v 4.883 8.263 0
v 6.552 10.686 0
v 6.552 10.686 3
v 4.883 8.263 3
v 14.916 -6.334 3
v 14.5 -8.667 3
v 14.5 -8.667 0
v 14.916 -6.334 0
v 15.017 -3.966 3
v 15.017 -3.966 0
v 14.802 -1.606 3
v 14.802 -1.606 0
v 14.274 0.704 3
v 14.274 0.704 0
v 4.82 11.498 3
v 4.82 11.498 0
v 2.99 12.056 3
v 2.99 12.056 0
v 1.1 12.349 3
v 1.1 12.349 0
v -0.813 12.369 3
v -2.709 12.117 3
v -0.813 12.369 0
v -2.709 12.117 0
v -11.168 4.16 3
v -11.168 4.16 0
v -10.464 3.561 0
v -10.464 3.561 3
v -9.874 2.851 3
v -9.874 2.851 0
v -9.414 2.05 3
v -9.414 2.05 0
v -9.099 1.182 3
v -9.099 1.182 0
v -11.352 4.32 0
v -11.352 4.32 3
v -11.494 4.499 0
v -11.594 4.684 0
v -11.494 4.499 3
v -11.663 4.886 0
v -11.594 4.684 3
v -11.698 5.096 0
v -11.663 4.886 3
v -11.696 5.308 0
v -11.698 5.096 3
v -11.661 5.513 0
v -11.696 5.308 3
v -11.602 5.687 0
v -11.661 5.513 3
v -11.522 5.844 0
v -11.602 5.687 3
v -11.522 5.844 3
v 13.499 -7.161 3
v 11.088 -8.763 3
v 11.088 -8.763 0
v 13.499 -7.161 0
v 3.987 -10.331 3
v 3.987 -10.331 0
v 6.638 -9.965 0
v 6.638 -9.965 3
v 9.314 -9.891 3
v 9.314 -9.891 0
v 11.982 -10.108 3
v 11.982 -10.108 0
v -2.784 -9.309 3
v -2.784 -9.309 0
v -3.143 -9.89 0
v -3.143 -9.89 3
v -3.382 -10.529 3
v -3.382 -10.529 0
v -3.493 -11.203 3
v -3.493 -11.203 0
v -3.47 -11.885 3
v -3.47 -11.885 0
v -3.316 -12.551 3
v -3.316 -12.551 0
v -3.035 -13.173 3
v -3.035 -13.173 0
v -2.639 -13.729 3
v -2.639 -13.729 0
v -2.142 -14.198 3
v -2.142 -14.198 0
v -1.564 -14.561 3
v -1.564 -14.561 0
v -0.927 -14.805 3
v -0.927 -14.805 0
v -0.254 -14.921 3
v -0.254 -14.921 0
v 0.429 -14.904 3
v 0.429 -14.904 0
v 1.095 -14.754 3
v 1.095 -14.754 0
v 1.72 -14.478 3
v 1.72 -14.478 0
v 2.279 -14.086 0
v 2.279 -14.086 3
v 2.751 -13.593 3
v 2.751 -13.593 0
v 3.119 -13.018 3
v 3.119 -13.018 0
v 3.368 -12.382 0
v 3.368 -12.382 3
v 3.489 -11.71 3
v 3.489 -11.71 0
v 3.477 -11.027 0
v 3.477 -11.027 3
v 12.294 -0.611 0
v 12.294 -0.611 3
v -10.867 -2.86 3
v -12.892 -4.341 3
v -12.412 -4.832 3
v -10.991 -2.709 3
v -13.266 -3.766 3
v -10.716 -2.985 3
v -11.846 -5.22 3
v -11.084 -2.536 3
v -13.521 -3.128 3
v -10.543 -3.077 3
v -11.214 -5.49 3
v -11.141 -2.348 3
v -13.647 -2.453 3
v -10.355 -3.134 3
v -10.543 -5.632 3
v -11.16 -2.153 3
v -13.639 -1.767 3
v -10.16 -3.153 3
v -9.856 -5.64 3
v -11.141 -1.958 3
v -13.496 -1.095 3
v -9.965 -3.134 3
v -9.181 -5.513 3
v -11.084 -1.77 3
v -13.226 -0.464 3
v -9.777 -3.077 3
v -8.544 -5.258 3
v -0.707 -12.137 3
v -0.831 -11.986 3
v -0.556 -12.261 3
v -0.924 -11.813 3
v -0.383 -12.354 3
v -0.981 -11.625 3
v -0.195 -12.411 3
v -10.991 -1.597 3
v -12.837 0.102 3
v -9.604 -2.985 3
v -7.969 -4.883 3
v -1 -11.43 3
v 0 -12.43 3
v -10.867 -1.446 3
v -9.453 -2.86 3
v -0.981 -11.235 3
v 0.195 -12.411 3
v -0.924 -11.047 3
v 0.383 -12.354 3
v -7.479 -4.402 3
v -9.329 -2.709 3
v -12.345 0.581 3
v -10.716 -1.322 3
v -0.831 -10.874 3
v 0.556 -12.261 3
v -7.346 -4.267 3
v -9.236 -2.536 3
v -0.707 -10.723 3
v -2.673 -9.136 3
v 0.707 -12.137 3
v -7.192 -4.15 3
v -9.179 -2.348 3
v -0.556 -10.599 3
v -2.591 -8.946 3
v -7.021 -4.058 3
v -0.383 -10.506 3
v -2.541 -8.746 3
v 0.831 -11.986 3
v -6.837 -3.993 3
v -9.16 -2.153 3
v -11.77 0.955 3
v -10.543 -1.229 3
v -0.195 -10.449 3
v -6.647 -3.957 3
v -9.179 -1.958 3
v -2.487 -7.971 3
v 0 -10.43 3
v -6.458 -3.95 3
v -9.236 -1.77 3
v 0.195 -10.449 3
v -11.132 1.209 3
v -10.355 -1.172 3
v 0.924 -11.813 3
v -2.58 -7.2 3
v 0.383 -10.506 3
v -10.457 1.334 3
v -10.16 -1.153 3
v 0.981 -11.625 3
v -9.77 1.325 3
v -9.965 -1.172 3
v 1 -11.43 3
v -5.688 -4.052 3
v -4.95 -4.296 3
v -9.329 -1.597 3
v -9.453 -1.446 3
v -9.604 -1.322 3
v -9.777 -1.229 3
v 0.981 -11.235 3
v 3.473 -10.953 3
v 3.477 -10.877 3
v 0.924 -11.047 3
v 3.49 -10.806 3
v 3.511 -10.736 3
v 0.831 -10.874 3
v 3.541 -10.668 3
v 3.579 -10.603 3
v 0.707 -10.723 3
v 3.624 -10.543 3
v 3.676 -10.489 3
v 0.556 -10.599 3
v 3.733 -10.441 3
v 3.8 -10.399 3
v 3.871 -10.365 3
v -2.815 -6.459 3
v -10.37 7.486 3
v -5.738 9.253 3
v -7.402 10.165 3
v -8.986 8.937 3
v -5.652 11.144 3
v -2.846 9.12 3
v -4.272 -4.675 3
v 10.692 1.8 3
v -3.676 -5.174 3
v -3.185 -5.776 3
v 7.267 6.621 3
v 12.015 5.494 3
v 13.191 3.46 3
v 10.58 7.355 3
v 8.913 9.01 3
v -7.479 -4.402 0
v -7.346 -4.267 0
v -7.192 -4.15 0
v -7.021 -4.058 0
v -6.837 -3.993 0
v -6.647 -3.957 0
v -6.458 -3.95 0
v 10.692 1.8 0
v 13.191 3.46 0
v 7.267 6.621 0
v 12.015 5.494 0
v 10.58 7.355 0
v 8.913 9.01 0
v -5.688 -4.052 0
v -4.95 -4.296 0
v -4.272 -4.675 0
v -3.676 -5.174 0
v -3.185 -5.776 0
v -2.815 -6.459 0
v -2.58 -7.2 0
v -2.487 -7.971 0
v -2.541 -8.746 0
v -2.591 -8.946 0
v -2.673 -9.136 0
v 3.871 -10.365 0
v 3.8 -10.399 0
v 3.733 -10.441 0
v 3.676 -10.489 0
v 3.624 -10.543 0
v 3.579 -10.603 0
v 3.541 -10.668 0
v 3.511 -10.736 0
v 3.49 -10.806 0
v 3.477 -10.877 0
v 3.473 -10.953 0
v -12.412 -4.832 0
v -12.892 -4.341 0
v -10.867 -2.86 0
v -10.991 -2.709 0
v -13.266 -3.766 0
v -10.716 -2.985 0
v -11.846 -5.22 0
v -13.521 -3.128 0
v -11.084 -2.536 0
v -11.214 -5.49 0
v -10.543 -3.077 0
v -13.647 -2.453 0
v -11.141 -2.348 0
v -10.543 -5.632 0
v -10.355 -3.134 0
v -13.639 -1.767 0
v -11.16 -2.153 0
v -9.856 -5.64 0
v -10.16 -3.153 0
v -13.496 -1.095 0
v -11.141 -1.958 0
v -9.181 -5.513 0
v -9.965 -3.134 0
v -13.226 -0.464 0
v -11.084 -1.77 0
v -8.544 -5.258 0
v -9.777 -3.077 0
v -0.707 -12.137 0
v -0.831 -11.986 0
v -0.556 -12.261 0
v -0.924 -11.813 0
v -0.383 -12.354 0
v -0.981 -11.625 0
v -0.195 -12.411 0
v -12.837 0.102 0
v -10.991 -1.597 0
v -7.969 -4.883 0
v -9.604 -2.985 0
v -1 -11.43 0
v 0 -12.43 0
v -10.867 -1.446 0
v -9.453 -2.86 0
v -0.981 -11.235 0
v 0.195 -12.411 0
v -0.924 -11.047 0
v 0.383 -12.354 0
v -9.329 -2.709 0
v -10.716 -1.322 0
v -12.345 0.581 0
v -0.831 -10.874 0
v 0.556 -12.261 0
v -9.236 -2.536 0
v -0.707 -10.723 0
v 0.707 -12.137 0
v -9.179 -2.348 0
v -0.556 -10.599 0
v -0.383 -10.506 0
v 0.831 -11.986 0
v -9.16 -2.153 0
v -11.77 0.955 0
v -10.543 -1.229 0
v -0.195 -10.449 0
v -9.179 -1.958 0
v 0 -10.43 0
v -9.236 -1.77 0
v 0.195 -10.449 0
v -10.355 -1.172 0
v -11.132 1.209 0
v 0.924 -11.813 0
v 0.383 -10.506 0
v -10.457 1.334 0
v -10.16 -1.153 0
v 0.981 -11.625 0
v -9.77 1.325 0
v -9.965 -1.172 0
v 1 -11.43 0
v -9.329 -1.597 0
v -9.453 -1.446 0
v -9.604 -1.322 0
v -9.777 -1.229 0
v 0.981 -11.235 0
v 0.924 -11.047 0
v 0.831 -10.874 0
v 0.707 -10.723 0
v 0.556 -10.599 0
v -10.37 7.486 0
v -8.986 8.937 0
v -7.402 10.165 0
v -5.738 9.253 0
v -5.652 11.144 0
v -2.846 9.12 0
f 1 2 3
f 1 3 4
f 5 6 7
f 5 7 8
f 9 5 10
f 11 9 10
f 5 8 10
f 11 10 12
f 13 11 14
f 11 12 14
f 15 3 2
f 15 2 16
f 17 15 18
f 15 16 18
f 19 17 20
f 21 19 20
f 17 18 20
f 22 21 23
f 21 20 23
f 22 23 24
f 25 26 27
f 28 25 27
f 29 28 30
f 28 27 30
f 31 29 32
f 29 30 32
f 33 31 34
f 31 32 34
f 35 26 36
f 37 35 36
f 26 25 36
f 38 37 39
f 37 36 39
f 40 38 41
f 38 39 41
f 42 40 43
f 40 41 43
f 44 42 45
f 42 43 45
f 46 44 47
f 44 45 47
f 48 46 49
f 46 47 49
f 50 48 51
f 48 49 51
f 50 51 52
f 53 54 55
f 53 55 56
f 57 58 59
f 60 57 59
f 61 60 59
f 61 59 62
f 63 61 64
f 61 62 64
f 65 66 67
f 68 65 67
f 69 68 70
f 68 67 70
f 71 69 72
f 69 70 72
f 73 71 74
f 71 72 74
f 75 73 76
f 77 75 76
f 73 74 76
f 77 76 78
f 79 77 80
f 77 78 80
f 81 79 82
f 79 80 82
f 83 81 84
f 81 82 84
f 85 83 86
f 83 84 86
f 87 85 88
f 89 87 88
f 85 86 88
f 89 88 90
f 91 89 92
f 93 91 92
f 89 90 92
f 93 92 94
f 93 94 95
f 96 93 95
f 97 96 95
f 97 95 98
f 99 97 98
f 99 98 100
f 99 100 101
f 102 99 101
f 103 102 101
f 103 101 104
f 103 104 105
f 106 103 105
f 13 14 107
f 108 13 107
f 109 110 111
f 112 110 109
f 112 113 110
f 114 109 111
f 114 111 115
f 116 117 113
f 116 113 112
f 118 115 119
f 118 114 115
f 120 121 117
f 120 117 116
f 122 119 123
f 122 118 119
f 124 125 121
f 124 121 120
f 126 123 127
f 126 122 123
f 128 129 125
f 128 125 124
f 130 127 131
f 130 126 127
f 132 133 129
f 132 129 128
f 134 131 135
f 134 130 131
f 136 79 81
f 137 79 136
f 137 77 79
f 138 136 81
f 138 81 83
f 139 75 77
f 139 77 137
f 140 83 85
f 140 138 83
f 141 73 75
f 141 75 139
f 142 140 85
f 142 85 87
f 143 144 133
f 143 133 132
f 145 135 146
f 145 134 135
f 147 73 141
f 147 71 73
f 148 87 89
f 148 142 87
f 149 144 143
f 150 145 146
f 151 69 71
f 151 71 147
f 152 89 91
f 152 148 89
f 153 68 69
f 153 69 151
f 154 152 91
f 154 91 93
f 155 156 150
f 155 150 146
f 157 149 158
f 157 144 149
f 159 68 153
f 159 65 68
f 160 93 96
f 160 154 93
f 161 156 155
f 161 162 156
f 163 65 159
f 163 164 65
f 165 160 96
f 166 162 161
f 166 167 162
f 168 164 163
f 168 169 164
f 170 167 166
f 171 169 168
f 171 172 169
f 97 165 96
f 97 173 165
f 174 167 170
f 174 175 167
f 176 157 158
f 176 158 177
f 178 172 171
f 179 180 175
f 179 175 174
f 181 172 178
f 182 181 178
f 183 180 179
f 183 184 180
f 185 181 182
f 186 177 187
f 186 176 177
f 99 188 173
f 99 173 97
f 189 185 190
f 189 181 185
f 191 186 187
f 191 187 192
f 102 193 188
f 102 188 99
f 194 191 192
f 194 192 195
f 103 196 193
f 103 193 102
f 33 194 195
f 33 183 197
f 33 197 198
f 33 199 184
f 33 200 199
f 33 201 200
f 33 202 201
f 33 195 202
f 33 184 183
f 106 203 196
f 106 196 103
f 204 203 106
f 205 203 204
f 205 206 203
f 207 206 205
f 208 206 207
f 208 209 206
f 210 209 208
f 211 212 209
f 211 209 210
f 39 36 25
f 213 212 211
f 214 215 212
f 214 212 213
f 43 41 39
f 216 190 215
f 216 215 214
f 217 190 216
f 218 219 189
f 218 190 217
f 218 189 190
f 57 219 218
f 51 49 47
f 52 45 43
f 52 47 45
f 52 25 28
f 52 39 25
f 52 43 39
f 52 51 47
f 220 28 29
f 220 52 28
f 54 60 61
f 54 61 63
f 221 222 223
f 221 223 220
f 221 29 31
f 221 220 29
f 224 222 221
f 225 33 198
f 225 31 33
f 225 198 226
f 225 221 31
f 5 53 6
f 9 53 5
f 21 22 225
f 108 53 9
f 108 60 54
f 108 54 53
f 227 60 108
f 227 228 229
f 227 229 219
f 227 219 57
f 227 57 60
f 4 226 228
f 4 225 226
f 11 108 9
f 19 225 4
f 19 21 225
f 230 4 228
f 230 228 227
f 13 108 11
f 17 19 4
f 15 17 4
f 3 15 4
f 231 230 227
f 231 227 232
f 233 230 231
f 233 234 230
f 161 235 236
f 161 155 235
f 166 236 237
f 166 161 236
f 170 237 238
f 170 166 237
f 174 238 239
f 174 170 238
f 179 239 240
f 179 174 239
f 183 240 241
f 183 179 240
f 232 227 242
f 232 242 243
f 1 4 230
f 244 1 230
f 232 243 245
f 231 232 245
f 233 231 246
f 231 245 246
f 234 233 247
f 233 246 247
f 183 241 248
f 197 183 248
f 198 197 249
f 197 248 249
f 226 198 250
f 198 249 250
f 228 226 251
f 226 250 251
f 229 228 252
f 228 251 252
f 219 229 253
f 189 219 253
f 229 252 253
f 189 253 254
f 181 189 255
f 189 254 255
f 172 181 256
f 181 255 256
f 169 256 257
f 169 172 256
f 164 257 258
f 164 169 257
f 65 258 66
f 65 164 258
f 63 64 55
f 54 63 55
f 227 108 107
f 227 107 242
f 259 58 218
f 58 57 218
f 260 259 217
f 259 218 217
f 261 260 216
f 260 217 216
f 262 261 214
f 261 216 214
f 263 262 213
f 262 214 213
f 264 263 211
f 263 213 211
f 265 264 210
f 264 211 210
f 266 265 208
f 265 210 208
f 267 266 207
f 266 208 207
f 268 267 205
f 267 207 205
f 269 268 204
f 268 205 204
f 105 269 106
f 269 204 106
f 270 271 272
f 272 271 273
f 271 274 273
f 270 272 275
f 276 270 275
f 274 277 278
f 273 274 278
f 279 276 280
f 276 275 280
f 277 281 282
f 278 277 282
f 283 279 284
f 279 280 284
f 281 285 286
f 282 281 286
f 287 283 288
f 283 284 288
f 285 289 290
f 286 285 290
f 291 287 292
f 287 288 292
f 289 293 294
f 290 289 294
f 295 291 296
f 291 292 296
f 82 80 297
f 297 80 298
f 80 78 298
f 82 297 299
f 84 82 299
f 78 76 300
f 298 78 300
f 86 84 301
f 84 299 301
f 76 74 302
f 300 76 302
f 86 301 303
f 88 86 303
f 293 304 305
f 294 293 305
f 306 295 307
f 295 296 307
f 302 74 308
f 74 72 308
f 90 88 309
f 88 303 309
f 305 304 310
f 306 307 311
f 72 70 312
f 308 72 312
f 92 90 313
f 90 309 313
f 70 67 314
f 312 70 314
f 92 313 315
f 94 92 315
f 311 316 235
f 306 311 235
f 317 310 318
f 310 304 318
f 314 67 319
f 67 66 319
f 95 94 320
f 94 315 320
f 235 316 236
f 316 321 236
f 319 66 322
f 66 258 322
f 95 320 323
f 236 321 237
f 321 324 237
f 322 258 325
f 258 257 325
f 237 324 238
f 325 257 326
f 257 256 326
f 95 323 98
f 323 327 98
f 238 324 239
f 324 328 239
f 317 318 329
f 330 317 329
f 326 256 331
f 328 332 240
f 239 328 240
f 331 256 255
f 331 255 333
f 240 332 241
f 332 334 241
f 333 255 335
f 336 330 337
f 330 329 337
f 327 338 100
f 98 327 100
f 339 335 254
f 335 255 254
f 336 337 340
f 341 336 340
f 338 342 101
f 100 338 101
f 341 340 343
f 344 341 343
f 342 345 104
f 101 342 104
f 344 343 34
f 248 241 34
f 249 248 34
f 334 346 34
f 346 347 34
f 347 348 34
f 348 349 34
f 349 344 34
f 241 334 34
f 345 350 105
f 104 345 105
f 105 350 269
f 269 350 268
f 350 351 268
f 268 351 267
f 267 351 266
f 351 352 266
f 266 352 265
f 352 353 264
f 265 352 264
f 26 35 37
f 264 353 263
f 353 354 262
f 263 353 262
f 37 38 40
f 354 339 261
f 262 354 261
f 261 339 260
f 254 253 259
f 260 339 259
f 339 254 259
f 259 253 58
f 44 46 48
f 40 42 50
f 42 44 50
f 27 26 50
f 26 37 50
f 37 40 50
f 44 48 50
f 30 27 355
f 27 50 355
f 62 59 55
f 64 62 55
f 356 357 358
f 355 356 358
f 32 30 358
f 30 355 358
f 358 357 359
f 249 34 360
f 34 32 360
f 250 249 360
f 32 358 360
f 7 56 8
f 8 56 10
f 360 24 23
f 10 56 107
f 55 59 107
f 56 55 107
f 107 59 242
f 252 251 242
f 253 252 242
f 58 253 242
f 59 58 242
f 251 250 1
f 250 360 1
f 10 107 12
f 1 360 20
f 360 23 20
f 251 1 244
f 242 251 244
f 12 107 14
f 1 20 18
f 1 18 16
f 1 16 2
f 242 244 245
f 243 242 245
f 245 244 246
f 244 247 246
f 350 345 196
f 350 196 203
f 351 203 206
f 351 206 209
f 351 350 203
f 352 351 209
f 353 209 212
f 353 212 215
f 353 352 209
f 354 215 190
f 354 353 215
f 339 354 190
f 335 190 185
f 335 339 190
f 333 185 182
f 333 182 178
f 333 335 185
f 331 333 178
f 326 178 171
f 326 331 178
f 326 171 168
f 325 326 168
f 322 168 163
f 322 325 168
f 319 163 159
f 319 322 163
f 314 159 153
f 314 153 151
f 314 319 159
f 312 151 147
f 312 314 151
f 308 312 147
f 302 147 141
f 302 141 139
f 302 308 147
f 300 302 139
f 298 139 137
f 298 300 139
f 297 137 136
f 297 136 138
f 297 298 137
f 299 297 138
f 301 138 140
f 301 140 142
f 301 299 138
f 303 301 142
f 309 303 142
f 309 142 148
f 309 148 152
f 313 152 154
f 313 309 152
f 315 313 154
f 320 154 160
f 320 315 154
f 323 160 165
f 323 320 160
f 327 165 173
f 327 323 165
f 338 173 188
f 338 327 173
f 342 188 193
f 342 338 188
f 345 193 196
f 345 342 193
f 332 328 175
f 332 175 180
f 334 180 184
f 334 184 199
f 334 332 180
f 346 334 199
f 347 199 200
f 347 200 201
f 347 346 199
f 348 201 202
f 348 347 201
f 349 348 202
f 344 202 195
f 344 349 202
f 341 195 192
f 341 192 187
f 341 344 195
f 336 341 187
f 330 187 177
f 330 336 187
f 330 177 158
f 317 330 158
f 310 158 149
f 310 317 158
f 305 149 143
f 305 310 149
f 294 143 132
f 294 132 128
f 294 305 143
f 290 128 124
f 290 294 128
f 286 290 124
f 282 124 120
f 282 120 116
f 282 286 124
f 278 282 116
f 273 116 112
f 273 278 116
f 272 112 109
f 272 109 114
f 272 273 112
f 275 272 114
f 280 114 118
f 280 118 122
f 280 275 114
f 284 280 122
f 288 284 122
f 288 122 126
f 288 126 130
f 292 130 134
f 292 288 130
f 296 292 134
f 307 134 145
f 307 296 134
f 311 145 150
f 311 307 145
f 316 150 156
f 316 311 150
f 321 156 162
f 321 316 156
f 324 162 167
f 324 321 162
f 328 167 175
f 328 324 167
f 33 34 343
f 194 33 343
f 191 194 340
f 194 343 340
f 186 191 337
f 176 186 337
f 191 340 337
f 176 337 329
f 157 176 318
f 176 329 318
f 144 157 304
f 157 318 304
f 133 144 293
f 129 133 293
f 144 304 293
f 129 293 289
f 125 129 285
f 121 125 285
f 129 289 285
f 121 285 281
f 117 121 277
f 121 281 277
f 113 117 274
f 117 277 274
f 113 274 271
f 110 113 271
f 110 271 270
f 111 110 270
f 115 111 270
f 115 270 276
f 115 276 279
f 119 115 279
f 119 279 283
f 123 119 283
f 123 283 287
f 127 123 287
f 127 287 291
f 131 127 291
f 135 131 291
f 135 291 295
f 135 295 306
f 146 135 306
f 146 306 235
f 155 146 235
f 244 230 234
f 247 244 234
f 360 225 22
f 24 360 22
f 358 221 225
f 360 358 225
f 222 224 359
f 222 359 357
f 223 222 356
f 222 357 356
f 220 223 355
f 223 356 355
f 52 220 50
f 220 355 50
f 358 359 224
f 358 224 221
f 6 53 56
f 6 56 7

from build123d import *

# Parameters (mm, degrees)
SKETCH_1_R          = 1
EXTRUDE_1_DEPTH     = 3
CUT_EXTRUDE_1_DEPTH = 3
FILLET_3_R          = 0.635
FILLET_4_R          = 1.27
FILLET_5_R          = 1.27


with BuildPart() as part:
    # 스케치1 → 보스-돌출1 (new body)
    with BuildSketch(Plane.XY):
        with BuildLine():
            ThreePointArc((13.953884727, -10.4604054), (14.378598245, 0.342544853), (8.460782986, 9.390394228))
            ThreePointArc((8.460782986, 9.390394228), (-2.974719352, 12.059159282), (-12.129056489, 4.704491905))
            ThreePointArc((-12.129056489, 4.704491905), (-10.212753099, 3.28852822), (-9.098885827, 1.182234902))
            ThreePointArc((-9.098885827, 1.182234902), (-13.440703993, -3.372455138), (-7.178058569, -3.985528264))
            ThreePointArc((-7.178058569, -3.985528264), (-3.531014476, -5.328655626), (-2.617256463, -9.106216747))
            ThreePointArc((-2.617256463, -9.106216747), (-0.772979034, -14.843576338), (3.363017442, -10.4604054))
            ThreePointArc((3.363017442, -10.4604054), (8.658451084, -9.881913195), (13.953884727, -10.4604054))
        make_face()
        with Locations((-10.16, -2.153036707)):
            Circle(SKETCH_1_R, mode=Mode.SUBTRACT)
        with Locations((0, -11.43)):
            Circle(SKETCH_1_R, mode=Mode.SUBTRACT)
    extrude(amount=EXTRUDE_1_DEPTH)

    # 스케치2 → 컷-돌출1 (cut)
    with BuildSketch(Plane.XY.offset(3)):
        Polygon((12.294266072, -0.611273139), (10.692062425, 1.799944079), (13.190733117, 3.460258739), (14.792936764, 1.049041521), align=None)
        Polygon((-5.738219006, 9.252553702), (-2.846256152, 9.119979742), (-2.708873811, 12.11683244), (-5.600836664, 12.2494064), align=None)
        Polygon((4.882638145, 8.263381657), (7.266602202, 6.620901711), (8.96865396, 9.091330786), (6.584689903, 10.733810732), align=None)
        Polygon((11.087961457, -8.762836531), (13.499178676, -7.160632884), (15.159493336, -9.659303577), (12.748276117, -11.261507224), align=None)
    extrude(amount=-CUT_EXTRUDE_1_DEPTH, mode=Mode.SUBTRACT)

    # 필렛3
    fillet_3_edges = [part.edges().sort_by_distance(p)[0] for p in [
        (3.363017442, -10.4604054, 1.5),
    ]]
    fillet(fillet_3_edges, radius=FILLET_3_R)

    # 필렛4
    fillet_4_edges = [part.edges().sort_by_distance(p)[0] for p in [
        (-12.129056489, 4.704491905, 1.5),
    ]]
    fillet(fillet_4_edges, radius=FILLET_4_R)

    # 필렛5
    fillet_5_edges = [part.edges().sort_by_distance(p)[0] for p in [
        (-2.617256463, -9.106216747, 1.5),
        (-7.178058569, -3.985528264, 1.5),
    ]]
    fillet(fillet_5_edges, radius=FILLET_5_R)


solid = part.part
